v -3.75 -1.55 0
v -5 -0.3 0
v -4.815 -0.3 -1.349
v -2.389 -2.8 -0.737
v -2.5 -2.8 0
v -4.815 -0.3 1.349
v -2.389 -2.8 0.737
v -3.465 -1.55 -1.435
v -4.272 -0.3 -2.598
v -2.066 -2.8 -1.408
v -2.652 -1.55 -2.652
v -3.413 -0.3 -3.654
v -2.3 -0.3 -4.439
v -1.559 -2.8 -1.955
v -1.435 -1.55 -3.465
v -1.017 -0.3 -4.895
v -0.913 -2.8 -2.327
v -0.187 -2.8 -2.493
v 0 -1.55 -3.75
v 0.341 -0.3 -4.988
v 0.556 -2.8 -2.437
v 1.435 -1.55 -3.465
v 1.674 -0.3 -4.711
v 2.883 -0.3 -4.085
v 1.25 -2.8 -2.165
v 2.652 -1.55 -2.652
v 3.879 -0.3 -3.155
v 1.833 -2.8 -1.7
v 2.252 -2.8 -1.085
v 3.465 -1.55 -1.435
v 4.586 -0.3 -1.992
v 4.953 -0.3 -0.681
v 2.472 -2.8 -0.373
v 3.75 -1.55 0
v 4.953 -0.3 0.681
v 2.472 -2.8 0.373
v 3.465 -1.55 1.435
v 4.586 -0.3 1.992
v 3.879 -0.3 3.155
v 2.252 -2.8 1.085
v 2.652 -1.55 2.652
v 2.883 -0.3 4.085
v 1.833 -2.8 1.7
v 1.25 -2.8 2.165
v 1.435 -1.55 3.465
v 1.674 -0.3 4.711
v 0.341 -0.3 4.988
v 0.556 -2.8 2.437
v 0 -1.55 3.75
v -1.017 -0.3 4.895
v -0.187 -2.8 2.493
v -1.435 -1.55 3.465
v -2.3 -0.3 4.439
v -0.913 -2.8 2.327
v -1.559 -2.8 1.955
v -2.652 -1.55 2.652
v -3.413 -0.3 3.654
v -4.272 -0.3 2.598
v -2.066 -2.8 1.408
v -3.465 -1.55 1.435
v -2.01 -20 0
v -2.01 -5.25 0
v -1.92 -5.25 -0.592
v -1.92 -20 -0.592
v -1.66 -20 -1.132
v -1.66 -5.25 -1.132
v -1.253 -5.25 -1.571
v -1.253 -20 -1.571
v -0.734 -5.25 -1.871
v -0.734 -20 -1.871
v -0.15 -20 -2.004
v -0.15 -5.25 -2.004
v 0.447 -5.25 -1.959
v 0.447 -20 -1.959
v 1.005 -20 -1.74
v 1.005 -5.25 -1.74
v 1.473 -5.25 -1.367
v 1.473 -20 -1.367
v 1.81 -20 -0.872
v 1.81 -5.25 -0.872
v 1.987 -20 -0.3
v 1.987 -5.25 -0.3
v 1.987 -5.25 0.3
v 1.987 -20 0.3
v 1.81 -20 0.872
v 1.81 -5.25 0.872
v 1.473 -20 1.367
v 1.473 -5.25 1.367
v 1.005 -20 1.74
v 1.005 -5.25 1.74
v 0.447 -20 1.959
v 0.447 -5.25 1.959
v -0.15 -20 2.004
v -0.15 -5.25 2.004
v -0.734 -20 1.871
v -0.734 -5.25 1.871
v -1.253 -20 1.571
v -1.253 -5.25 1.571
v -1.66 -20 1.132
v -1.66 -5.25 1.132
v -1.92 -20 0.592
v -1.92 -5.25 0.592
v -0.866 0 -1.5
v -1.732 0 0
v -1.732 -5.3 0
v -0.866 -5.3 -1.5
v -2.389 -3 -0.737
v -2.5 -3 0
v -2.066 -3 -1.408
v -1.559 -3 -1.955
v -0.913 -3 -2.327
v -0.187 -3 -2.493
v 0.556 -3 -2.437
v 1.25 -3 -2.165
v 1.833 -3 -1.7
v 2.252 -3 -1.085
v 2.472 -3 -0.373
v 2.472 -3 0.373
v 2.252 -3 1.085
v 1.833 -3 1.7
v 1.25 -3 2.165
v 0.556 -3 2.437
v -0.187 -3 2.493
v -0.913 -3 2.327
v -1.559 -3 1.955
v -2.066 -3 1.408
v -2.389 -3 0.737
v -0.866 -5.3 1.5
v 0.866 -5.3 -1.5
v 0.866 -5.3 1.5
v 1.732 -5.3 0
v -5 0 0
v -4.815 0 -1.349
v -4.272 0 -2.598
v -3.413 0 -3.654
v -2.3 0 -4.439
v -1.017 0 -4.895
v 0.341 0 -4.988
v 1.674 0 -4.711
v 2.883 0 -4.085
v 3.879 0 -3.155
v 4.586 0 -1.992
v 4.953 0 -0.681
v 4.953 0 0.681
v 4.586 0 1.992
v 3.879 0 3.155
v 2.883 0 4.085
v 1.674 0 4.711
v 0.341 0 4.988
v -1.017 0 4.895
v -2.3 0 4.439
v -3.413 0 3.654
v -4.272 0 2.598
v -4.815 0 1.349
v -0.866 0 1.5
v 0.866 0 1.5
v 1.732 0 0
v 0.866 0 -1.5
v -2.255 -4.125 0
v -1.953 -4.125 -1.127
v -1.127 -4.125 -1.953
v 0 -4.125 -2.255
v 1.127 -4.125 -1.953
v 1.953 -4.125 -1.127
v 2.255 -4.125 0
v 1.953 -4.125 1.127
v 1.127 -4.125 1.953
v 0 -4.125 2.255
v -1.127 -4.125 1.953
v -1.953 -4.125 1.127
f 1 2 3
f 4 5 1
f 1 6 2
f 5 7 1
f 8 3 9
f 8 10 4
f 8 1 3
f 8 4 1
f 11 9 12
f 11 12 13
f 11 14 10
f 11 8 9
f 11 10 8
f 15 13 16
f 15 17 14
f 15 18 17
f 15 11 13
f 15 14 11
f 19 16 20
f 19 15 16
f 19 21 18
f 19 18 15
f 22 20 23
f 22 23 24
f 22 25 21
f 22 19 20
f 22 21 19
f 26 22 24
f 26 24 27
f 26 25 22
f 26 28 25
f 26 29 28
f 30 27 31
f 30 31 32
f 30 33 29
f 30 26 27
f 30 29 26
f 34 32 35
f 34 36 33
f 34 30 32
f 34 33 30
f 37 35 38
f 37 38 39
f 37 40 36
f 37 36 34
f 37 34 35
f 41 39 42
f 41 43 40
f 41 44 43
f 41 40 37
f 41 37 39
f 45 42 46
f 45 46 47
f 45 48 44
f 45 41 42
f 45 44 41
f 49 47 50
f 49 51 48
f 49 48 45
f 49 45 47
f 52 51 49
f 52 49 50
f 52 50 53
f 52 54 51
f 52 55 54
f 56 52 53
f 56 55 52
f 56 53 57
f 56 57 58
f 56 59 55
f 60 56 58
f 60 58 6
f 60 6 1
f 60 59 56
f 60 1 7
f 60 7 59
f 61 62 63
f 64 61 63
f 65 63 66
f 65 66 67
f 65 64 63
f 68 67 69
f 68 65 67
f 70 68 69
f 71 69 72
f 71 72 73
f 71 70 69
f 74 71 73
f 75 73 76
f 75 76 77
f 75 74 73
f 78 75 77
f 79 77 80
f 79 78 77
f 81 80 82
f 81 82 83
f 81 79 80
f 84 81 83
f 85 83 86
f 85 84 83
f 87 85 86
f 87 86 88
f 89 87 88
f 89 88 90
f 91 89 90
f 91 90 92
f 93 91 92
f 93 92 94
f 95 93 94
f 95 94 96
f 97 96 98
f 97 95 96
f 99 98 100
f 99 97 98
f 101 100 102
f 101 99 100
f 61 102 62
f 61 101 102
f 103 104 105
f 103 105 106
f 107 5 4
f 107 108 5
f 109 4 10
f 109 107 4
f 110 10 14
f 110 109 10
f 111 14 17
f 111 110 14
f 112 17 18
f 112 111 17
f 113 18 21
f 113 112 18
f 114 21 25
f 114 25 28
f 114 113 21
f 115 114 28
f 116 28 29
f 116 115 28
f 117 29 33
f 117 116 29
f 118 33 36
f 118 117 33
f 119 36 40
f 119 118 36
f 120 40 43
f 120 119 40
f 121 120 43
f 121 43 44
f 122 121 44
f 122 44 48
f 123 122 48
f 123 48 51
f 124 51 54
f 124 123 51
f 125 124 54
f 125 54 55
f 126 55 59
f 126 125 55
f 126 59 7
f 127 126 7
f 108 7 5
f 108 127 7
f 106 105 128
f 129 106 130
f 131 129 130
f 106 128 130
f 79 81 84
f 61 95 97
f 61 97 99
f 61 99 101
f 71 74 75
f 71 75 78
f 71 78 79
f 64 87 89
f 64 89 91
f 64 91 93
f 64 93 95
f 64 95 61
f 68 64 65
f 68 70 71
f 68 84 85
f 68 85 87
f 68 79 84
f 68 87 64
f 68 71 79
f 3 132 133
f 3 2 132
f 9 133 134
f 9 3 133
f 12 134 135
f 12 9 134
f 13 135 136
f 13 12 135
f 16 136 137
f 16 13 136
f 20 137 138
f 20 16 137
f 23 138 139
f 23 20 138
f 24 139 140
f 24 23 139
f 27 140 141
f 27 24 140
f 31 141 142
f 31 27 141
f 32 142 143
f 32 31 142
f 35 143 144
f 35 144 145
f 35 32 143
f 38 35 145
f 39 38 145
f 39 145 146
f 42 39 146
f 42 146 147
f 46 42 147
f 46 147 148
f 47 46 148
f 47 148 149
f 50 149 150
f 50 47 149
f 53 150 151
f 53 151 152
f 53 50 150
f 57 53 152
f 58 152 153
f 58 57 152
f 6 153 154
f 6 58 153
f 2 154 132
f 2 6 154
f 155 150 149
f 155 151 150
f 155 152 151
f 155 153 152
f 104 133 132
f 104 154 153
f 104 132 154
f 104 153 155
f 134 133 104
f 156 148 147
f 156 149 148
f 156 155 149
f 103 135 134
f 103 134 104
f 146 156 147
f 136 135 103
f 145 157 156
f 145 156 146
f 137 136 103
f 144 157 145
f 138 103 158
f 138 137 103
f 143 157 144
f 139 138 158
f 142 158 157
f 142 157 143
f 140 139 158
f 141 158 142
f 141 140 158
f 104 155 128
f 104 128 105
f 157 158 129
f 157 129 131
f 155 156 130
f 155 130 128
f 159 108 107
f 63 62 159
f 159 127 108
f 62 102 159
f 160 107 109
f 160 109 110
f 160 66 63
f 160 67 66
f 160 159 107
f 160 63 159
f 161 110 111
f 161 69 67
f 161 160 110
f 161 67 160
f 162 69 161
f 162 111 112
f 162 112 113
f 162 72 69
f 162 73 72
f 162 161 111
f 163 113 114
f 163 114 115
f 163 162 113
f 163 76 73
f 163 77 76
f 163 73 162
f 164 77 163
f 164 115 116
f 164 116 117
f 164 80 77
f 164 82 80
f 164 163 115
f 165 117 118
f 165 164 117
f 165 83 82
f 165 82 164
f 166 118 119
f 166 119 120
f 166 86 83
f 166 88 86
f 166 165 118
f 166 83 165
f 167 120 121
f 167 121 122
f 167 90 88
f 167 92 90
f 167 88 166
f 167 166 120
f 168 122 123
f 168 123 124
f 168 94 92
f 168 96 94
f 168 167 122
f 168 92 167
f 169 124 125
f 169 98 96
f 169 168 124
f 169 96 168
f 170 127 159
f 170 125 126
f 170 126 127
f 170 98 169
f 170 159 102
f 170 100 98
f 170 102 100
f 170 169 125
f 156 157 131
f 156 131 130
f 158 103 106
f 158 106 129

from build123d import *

# Parameters (mm, degrees)
SCHNITT_LINEAR_AUSTRAGEN1_DEPTH = 5.3


with BuildPart() as part:
    # Skizze1 → Basis-Rotation (revolve)
    with BuildSketch(Plane.XY, mode=Mode.PRIVATE) as basis_rotation_sk:
        Polygon((0, 0), (5, 0), (5, -0.3), (2.5, -2.8), (2.5, -3), (2.0095, -5.25), (2.0095, -20), (0, -20), align=None)
    revolve(basis_rotation_sk.sketch.rotate(Axis((0, 0, 0), (0, -1, 0)), 180), axis=Axis((0, 0, 0), (0, -1, 0)))

    # Skizze2 → Schnitt-Linear austragen1 (cut)
    with BuildSketch(Plane(origin=(0, 0, 0), x_dir=(-1, 0, 0), z_dir=(0, 1, 0))):
        Polygon((0.866025404, -1.5), (-0.866025404, -1.5), (-1.732050808, 0), (-0.866025404, 1.5), (0.866025404, 1.5), (1.732050808, 0), align=None)
    extrude(amount=-SCHNITT_LINEAR_AUSTRAGEN1_DEPTH, mode=Mode.SUBTRACT)


solid = part.part
